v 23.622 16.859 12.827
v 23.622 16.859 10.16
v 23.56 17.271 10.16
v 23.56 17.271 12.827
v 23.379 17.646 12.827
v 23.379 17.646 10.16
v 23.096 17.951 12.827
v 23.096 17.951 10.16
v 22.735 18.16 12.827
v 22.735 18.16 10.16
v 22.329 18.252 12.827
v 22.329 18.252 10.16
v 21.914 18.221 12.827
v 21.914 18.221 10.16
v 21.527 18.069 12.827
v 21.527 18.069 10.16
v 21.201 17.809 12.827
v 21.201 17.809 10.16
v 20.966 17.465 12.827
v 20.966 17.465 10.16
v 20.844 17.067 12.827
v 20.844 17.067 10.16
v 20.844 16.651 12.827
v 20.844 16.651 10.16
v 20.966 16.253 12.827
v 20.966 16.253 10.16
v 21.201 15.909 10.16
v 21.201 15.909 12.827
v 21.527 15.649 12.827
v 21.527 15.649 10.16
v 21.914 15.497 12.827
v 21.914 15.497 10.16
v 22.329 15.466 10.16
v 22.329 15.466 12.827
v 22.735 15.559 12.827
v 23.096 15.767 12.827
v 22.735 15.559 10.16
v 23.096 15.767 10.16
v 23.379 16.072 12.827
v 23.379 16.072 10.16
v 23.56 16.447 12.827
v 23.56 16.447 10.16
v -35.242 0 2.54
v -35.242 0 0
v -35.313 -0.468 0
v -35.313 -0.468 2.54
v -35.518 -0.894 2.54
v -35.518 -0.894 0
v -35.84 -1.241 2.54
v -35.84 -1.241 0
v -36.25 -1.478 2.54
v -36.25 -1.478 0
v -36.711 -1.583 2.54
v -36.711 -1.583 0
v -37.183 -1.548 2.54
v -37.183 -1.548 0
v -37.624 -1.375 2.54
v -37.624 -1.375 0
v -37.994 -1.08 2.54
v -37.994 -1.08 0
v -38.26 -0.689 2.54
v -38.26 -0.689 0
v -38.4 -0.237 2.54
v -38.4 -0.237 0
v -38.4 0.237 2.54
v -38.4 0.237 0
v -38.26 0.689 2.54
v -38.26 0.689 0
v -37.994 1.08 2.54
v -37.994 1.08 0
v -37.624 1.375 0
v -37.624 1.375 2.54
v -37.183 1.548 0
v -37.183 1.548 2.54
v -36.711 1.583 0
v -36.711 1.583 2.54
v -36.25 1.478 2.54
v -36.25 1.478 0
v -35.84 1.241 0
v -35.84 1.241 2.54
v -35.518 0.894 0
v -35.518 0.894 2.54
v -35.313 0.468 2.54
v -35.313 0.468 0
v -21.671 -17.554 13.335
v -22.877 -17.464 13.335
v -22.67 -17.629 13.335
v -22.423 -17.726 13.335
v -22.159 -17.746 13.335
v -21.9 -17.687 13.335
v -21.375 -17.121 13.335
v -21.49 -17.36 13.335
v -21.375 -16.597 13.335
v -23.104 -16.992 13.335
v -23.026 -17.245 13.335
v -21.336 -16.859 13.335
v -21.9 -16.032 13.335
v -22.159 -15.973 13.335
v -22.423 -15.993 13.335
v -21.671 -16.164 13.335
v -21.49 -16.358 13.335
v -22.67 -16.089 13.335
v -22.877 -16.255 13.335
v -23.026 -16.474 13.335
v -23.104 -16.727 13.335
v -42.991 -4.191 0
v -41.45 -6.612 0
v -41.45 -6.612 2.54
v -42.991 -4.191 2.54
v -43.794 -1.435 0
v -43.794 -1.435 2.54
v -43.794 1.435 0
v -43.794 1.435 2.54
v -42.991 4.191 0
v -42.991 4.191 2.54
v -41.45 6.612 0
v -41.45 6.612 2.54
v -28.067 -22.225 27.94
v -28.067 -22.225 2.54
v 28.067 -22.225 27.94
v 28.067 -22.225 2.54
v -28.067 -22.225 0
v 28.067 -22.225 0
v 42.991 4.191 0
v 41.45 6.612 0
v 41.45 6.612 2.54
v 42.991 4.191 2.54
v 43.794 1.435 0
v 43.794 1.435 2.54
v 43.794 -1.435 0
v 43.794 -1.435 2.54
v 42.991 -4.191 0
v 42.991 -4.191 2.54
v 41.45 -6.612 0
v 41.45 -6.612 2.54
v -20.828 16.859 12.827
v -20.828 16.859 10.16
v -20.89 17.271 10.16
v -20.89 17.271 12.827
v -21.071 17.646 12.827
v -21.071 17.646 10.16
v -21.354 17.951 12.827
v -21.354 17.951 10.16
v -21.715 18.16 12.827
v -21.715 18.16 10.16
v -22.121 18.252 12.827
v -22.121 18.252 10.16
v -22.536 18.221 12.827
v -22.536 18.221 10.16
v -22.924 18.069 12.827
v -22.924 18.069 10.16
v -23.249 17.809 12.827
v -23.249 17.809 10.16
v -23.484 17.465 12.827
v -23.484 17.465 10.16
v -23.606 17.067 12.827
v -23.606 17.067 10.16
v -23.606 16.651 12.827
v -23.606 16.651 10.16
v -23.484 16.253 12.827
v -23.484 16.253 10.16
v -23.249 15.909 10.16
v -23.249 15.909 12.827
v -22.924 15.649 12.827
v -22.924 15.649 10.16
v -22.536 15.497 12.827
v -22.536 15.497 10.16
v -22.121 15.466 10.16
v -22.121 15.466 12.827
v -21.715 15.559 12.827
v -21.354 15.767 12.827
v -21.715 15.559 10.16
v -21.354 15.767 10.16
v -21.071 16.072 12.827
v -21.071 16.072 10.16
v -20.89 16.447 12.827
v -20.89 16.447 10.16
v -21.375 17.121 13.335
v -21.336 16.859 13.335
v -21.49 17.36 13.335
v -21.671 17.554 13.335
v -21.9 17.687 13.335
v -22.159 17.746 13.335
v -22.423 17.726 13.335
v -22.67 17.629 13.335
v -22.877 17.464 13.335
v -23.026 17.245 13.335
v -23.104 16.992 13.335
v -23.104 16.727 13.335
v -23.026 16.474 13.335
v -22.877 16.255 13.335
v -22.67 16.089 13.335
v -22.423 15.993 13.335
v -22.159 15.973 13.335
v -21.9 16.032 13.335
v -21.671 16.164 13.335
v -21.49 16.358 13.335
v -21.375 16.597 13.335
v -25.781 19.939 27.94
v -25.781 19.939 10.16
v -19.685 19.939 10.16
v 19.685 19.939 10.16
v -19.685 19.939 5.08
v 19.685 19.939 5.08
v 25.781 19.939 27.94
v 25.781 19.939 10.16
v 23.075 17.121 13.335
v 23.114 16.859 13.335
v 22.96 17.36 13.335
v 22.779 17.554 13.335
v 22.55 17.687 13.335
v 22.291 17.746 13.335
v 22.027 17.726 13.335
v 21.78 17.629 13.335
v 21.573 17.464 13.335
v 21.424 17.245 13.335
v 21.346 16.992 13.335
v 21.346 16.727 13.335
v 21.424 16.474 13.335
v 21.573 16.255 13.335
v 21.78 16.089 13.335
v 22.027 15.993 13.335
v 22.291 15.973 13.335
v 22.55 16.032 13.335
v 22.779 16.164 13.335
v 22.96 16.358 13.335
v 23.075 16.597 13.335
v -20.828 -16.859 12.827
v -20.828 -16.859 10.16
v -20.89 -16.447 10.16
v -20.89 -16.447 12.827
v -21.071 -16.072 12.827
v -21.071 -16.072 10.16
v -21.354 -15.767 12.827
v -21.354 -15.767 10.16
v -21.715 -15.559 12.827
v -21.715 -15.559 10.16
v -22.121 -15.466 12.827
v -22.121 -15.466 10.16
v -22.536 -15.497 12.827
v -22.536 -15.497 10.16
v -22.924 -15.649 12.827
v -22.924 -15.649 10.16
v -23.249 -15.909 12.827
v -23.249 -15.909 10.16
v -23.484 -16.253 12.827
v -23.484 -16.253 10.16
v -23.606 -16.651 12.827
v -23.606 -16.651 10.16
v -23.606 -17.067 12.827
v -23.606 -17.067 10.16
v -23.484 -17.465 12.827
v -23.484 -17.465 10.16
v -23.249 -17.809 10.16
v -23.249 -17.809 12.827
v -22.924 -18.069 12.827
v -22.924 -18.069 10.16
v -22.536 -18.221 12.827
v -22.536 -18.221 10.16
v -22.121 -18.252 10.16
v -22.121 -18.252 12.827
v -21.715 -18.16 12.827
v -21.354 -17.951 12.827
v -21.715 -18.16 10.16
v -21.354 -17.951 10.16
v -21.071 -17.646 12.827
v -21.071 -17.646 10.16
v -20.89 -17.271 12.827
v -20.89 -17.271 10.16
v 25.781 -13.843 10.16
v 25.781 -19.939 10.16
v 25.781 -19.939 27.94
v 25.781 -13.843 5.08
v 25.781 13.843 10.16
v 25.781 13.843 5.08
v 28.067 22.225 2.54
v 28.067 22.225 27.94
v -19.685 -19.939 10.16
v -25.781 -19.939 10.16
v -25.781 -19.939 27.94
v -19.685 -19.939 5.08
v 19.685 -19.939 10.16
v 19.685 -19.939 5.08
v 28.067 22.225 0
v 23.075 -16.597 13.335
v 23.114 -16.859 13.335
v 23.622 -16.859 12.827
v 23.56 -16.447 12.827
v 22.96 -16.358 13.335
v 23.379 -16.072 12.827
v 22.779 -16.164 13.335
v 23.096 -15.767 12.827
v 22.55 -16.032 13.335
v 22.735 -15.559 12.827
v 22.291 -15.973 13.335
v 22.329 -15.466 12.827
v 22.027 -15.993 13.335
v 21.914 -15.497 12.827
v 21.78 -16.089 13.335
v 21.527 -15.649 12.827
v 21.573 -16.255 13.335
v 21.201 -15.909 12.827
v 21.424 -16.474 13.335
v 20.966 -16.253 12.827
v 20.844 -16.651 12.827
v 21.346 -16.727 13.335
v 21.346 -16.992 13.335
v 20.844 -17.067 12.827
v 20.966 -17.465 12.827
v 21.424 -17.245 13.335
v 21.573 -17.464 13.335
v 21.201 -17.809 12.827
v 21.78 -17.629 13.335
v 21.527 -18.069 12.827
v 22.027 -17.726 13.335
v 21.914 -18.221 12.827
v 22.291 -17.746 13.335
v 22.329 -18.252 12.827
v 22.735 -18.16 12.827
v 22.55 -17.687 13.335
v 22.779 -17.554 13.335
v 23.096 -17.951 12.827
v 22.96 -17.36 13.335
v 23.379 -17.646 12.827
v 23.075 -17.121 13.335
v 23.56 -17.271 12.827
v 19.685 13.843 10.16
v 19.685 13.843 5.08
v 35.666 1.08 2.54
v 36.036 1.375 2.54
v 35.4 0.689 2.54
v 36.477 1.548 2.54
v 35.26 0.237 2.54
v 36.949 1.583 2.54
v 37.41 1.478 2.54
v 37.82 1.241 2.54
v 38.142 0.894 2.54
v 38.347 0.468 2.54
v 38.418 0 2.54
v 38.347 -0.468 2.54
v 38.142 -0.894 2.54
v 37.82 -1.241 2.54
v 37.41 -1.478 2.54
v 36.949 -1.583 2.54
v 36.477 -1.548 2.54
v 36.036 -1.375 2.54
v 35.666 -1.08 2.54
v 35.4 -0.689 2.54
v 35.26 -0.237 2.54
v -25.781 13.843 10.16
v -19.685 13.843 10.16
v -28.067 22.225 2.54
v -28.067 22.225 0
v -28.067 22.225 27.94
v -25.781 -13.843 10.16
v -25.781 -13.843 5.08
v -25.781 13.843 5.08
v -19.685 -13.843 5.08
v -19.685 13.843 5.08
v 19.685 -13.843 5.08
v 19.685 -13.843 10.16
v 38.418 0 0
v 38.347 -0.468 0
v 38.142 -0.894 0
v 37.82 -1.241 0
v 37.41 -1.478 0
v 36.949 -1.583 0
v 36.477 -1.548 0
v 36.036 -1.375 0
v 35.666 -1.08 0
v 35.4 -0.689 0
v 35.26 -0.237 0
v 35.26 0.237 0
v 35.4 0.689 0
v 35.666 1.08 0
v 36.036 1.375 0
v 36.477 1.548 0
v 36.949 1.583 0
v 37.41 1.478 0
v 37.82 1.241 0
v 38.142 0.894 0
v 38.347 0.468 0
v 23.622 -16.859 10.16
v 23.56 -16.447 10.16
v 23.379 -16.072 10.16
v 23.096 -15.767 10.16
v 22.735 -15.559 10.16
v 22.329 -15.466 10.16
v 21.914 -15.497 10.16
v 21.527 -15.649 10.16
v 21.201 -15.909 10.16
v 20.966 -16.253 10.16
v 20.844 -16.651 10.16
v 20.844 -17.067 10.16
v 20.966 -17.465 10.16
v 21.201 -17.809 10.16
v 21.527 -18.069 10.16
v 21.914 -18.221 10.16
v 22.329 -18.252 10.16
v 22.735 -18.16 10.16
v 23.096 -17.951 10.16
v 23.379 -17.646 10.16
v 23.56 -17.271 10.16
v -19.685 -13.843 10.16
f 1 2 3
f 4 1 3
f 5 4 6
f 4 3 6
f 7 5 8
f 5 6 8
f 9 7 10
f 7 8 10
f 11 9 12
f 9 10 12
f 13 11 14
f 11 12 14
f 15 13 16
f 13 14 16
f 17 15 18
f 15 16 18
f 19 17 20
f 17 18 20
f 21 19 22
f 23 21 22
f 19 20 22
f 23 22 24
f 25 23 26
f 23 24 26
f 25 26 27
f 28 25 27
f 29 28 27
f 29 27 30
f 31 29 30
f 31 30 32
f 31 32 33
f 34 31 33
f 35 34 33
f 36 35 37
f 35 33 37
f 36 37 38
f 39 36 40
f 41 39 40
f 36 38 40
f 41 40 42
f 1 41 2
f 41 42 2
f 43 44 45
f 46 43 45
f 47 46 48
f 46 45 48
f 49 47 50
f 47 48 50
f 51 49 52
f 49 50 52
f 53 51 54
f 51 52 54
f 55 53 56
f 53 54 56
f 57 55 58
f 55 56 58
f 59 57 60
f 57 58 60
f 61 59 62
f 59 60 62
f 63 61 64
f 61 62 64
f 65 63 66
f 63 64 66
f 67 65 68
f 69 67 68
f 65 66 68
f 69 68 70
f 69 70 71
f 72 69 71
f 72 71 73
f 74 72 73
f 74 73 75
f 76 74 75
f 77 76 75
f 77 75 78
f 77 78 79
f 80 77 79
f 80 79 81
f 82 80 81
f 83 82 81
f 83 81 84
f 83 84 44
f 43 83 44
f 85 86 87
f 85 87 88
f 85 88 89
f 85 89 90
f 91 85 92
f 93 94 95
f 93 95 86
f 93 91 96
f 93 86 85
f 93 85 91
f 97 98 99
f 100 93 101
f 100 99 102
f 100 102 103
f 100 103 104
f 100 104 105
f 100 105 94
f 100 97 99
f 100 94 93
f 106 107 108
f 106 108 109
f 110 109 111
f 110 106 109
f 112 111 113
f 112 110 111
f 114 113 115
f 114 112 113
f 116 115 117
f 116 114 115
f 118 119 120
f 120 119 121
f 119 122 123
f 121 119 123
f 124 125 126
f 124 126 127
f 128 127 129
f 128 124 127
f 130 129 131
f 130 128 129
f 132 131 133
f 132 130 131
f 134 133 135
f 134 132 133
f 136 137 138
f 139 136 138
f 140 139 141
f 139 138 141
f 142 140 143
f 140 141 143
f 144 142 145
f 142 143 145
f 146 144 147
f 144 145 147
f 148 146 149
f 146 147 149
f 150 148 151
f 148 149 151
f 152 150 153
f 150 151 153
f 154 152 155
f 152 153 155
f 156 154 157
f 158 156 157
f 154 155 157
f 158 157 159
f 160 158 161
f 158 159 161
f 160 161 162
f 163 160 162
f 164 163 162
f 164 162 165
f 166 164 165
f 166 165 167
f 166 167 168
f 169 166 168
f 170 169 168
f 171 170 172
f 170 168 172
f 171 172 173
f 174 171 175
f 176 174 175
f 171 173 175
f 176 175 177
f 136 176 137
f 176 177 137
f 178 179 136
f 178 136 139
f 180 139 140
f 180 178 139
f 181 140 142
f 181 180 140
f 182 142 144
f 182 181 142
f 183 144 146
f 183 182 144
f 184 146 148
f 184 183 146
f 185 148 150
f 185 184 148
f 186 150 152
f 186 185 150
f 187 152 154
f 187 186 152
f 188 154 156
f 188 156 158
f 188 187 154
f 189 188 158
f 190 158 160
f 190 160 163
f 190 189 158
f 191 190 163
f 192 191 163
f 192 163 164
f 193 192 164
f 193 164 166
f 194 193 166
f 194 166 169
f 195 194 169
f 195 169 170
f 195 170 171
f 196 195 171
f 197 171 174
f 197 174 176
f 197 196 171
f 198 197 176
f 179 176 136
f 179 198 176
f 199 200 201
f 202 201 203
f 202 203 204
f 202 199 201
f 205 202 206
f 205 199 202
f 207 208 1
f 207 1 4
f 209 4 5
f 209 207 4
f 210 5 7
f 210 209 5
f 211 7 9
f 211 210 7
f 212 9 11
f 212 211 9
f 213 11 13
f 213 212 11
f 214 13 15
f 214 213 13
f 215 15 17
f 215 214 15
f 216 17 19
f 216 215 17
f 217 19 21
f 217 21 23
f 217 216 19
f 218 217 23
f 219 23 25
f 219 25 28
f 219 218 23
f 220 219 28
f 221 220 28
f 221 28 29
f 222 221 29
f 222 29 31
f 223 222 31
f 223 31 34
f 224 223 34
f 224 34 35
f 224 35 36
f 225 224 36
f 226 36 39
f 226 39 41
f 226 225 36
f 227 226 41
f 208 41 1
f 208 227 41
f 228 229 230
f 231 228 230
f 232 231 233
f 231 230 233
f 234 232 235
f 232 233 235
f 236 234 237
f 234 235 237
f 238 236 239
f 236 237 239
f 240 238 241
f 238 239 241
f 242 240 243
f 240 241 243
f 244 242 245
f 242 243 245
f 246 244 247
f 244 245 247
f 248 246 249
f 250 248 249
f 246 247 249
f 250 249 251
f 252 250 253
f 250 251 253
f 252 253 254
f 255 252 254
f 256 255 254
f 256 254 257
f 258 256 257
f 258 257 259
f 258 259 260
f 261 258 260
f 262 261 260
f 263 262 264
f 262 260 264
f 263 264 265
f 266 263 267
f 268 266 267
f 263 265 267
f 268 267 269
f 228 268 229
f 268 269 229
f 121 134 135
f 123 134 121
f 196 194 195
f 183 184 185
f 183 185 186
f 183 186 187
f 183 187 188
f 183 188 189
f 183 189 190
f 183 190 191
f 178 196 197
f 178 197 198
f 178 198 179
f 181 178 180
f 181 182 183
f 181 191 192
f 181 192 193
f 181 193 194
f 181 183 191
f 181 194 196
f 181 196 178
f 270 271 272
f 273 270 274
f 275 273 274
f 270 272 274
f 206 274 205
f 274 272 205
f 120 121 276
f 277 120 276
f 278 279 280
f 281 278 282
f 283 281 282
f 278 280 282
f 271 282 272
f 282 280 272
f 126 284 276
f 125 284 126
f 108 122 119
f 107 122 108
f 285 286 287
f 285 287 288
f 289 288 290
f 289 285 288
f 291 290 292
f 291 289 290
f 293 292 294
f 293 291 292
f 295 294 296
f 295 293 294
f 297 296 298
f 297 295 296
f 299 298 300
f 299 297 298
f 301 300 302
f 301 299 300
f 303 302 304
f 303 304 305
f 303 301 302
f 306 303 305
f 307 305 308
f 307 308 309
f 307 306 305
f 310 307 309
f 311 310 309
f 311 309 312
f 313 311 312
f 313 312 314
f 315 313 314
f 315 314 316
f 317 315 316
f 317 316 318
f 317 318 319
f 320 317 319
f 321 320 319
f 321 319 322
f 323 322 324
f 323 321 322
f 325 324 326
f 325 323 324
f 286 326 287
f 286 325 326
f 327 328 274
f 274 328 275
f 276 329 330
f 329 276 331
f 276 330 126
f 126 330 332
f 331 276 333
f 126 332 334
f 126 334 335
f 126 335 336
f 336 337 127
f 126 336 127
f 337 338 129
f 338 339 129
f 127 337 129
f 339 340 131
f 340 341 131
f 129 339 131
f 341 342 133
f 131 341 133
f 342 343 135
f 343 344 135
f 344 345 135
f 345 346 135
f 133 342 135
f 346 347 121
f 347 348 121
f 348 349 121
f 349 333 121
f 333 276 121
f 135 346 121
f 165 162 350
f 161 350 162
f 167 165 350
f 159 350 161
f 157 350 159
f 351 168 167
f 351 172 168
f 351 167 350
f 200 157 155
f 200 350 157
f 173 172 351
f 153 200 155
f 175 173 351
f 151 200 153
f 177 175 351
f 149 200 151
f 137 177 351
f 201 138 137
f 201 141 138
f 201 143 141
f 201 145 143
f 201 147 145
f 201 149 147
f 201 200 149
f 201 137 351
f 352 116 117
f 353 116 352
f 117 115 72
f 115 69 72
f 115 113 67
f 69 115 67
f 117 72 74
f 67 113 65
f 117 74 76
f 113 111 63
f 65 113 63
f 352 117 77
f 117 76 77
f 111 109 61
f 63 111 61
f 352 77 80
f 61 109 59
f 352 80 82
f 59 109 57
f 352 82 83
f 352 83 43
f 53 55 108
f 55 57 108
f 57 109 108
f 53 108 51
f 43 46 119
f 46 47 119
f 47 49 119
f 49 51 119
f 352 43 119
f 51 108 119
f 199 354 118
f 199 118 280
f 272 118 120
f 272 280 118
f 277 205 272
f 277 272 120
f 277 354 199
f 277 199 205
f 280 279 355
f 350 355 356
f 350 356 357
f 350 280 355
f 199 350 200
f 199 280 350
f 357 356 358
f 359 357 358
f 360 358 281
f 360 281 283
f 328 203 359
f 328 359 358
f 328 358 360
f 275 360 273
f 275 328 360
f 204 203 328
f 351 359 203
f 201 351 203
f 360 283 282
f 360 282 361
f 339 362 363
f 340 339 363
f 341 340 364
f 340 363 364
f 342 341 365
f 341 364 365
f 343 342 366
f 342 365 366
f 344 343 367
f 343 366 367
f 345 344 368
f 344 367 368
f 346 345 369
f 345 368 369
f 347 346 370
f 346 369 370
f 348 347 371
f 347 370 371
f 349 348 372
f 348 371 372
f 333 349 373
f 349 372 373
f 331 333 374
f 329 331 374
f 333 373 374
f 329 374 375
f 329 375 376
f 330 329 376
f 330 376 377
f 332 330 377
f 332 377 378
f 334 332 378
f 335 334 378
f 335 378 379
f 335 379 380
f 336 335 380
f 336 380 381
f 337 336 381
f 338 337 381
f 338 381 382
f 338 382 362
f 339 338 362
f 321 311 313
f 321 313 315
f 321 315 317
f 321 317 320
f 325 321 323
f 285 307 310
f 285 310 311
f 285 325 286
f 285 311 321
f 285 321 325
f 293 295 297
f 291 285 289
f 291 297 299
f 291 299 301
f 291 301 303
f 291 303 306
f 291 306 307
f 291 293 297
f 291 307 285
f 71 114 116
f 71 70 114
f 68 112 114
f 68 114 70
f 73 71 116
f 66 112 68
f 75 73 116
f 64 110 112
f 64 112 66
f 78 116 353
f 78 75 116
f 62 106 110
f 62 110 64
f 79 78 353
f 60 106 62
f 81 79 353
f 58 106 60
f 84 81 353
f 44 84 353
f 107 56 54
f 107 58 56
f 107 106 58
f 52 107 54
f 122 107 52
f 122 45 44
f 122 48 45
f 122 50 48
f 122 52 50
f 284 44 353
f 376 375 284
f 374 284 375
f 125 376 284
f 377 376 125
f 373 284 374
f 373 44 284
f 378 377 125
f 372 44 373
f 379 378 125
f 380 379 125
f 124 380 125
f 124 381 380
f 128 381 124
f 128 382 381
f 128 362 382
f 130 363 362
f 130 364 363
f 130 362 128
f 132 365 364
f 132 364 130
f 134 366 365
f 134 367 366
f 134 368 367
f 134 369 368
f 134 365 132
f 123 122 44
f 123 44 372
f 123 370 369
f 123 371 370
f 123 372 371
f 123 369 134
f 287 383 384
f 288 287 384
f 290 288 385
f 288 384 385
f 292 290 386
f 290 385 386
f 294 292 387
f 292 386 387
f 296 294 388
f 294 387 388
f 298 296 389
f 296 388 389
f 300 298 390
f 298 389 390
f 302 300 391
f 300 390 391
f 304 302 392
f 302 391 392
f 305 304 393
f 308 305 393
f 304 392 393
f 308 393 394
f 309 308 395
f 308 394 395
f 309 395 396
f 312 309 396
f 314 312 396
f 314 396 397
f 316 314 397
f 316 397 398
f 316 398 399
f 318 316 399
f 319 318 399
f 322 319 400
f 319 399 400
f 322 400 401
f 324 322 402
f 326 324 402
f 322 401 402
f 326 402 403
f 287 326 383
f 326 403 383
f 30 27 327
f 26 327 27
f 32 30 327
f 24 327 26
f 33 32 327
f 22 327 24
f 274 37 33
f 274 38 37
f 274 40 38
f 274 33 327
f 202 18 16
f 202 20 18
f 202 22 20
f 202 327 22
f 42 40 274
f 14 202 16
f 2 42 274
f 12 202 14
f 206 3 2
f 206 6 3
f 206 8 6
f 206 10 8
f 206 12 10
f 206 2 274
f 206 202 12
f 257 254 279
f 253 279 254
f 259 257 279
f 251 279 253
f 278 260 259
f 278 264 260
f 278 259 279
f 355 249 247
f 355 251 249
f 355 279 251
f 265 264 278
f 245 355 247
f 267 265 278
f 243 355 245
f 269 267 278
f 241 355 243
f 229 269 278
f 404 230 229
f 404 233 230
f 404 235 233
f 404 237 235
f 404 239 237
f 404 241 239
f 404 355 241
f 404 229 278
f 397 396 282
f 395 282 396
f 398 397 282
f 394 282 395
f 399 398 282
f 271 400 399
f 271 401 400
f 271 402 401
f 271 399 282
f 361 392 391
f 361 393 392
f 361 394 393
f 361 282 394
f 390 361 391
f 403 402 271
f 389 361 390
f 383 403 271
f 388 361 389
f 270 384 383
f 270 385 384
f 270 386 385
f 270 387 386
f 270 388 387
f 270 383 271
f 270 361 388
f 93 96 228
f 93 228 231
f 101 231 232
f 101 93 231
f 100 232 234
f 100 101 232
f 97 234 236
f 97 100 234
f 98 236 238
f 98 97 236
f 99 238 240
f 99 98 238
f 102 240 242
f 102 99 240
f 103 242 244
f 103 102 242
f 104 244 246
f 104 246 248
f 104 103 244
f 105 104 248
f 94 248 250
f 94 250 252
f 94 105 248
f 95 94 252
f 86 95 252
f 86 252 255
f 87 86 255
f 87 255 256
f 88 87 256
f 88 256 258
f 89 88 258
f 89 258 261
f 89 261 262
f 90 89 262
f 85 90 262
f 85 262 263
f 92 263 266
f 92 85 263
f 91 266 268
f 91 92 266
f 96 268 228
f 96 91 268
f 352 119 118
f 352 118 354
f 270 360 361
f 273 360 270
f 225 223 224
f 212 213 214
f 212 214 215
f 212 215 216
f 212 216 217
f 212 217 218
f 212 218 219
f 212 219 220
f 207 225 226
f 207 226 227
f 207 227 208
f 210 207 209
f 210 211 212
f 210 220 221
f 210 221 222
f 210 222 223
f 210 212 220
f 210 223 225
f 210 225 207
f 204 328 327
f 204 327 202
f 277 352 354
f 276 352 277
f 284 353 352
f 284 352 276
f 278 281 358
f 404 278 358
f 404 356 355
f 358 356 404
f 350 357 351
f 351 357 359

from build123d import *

# Parameters (mm, degrees)
F0_W      = 56.134
F0_H      = 44.45
F1_DEPTH  = 27.94
F2_W      = 51.562
F2_H      = 39.878
F3_DEPTH  = 22.86
F4_W      = 6.096
F4_H      = 6.096
F5_DEPTH  = 5.08
F6_R      = 1.397
F7_DEPTH  = 3.175
F8_SIZE   = 0.508
F10_DEPTH = 2.54
F11_R     = 1.5875
F12_DEPTH = 25.4


with BuildPart() as f1:
    # F0 (on Top) → F1 (new body)
    with BuildSketch(Plane.XY):
        Rectangle(F0_W, F0_H)
    extrude(amount=F1_DEPTH)

    # F2 (on face) → F3 (cut)
    with BuildSketch(Plane.XY.offset(27.94)):
        Rectangle(F2_W, F2_H)
    extrude(amount=-F3_DEPTH, mode=Mode.SUBTRACT)

    # F4 (on face) → F5 (join)
    with BuildSketch(Plane.XY.offset(5.08)):
        with Locations((-22.733, 16.891)):
            Rectangle(F4_W, F4_H)
        with Locations((22.733, 16.891)):
            Rectangle(F4_W, F4_H)
        with Locations((-22.733, -16.891)):
            Rectangle(F4_W, F4_H)
        with Locations((22.733, -16.891)):
            Rectangle(F4_W, F4_H)
    extrude(amount=F5_DEPTH)

    # F6 (on face) → F7 (join)
    with BuildSketch(Plane.XY.offset(10.16)):
        with Locations((-22.225, 16.85925)):
            Circle(F6_R)
        with Locations((22.225, 16.85925)):
            Circle(F6_R)
        with Locations((22.225, -16.85925)):
            Circle(F6_R)
        with Locations((-22.225, -16.85925)):
            Circle(F6_R)
    extrude(amount=F7_DEPTH)

    # F8
    f8_edges = [f1.edges().sort_by_distance(p)[0] for p in [
        (-23.622, 16.85925, 13.335),
        (20.828, 16.85925, 13.335),
        (-23.622, -16.85925, 13.335),
        (20.828, -16.85925, 13.335),
    ]]
    chamfer(f8_edges, length=F8_SIZE)

    # F9 (on face) → F10 (join)
    with BuildSketch(Plane(origin=(0, 0, 0), x_dir=(1, 0, 0), z_dir=(0, 0, -1))):
        with BuildLine():
            Line((41.449537, 6.61204), (28.067, 22.225))
            Line((28.067, 22.225), (28.067, -22.225))
            Line((28.067, -22.225), (41.449537, -6.61204))
            ThreePointArc((41.449537, -6.61204), (43.89549, 0), (41.449537, 6.61204))
        make_face()
        with BuildLine():
            Line((-28.067, -22.225), (-28.067, 22.225))
            Line((-28.067, 22.225), (-41.449537, 6.61204))
            ThreePointArc((-41.449537, 6.61204), (-43.89549, 0), (-41.449537, -6.61204))
            Line((-41.449537, -6.61204), (-28.067, -22.225))
        make_face()
    extrude(amount=-F10_DEPTH)

    # F11 (on face) → F12 (cut)
    with BuildSketch(Plane(origin=(0, 0, 0), x_dir=(1, 0, 0), z_dir=(0, 0, -1))):
        with Locations((-36.83, 0)):
            Circle(F11_R)
        with Locations((36.83, 0)):
            Circle(F11_R)
    extrude(amount=-F12_DEPTH, mode=Mode.SUBTRACT)


solid = f1.part
